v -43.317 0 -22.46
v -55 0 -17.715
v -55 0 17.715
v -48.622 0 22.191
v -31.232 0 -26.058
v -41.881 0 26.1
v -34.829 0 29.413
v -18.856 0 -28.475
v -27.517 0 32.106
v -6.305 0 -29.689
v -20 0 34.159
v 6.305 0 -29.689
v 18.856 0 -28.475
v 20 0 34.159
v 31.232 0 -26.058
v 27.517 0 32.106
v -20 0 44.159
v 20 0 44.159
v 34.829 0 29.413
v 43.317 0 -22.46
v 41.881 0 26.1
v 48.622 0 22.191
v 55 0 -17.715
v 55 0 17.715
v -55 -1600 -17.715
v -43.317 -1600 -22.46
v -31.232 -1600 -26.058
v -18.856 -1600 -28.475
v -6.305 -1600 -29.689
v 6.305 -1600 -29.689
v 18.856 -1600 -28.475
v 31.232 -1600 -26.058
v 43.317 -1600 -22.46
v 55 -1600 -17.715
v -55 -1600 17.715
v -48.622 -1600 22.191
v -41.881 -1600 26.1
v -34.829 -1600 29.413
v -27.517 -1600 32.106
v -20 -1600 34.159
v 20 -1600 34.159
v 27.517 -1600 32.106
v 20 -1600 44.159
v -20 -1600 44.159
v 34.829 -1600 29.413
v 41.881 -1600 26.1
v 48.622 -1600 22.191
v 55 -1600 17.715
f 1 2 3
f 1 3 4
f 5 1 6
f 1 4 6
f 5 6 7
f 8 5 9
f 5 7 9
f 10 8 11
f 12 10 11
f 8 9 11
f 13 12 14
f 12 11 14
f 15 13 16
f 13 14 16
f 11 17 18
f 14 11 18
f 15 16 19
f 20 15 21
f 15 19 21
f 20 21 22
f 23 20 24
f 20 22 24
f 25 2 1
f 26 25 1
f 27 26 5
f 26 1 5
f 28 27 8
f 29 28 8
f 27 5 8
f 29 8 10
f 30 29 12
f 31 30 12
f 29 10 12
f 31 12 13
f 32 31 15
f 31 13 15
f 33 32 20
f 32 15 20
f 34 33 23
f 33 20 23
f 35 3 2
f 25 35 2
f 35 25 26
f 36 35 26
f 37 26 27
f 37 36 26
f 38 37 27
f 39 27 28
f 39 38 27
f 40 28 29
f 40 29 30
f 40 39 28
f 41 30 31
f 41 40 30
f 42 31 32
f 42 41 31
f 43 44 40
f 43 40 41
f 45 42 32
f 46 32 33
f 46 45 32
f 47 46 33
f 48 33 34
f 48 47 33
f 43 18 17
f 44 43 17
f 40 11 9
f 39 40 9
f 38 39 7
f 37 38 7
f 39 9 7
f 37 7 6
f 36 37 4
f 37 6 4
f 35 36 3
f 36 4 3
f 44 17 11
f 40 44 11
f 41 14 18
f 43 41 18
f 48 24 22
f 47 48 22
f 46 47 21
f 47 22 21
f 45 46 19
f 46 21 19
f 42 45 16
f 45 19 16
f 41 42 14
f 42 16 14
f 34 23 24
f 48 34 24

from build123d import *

# Parameters (mm, degrees)
F1_DEPTH = 1600


# Not quite as in the source:
# - ends of sketch curves that miss each other by under 0.0002 mm in the source are joined


with BuildPart() as f1:
    # F0 (on Front) → F1 (new body)
    with BuildSketch(Plane.XZ):
        with BuildLine():
            Line((54.9999419978, -17.7153473352), (55.0000580024, 17.7152582231))
            ThreePointArc((55.0000580024, 17.7152582231), (38.3907297006, 27.832811217), (20, 34.1586096885))
            Line((20, 34.1586096885), (20, 44.1586096885))
            Line((20, 44.1586096885), (-20, 44.1586096885))
            Line((-20, 44.1586096885), (-20, 34.1586096885))
            ThreePointArc((-20, 34.1586096885), (-38.390663502, 27.8328423177), (-54.9999419978, 17.7153473352))
            Line((-54.9999419978, 17.7153473352), (-55.0000580024, -17.7152582231))
            ThreePointArc((-55.0000580024, -17.7152582231), (-6.78258e-05, -29.8413903114), (54.9999419978, -17.7153473352))
        make_face()
    extrude(amount=F1_DEPTH)


solid = f1.part
